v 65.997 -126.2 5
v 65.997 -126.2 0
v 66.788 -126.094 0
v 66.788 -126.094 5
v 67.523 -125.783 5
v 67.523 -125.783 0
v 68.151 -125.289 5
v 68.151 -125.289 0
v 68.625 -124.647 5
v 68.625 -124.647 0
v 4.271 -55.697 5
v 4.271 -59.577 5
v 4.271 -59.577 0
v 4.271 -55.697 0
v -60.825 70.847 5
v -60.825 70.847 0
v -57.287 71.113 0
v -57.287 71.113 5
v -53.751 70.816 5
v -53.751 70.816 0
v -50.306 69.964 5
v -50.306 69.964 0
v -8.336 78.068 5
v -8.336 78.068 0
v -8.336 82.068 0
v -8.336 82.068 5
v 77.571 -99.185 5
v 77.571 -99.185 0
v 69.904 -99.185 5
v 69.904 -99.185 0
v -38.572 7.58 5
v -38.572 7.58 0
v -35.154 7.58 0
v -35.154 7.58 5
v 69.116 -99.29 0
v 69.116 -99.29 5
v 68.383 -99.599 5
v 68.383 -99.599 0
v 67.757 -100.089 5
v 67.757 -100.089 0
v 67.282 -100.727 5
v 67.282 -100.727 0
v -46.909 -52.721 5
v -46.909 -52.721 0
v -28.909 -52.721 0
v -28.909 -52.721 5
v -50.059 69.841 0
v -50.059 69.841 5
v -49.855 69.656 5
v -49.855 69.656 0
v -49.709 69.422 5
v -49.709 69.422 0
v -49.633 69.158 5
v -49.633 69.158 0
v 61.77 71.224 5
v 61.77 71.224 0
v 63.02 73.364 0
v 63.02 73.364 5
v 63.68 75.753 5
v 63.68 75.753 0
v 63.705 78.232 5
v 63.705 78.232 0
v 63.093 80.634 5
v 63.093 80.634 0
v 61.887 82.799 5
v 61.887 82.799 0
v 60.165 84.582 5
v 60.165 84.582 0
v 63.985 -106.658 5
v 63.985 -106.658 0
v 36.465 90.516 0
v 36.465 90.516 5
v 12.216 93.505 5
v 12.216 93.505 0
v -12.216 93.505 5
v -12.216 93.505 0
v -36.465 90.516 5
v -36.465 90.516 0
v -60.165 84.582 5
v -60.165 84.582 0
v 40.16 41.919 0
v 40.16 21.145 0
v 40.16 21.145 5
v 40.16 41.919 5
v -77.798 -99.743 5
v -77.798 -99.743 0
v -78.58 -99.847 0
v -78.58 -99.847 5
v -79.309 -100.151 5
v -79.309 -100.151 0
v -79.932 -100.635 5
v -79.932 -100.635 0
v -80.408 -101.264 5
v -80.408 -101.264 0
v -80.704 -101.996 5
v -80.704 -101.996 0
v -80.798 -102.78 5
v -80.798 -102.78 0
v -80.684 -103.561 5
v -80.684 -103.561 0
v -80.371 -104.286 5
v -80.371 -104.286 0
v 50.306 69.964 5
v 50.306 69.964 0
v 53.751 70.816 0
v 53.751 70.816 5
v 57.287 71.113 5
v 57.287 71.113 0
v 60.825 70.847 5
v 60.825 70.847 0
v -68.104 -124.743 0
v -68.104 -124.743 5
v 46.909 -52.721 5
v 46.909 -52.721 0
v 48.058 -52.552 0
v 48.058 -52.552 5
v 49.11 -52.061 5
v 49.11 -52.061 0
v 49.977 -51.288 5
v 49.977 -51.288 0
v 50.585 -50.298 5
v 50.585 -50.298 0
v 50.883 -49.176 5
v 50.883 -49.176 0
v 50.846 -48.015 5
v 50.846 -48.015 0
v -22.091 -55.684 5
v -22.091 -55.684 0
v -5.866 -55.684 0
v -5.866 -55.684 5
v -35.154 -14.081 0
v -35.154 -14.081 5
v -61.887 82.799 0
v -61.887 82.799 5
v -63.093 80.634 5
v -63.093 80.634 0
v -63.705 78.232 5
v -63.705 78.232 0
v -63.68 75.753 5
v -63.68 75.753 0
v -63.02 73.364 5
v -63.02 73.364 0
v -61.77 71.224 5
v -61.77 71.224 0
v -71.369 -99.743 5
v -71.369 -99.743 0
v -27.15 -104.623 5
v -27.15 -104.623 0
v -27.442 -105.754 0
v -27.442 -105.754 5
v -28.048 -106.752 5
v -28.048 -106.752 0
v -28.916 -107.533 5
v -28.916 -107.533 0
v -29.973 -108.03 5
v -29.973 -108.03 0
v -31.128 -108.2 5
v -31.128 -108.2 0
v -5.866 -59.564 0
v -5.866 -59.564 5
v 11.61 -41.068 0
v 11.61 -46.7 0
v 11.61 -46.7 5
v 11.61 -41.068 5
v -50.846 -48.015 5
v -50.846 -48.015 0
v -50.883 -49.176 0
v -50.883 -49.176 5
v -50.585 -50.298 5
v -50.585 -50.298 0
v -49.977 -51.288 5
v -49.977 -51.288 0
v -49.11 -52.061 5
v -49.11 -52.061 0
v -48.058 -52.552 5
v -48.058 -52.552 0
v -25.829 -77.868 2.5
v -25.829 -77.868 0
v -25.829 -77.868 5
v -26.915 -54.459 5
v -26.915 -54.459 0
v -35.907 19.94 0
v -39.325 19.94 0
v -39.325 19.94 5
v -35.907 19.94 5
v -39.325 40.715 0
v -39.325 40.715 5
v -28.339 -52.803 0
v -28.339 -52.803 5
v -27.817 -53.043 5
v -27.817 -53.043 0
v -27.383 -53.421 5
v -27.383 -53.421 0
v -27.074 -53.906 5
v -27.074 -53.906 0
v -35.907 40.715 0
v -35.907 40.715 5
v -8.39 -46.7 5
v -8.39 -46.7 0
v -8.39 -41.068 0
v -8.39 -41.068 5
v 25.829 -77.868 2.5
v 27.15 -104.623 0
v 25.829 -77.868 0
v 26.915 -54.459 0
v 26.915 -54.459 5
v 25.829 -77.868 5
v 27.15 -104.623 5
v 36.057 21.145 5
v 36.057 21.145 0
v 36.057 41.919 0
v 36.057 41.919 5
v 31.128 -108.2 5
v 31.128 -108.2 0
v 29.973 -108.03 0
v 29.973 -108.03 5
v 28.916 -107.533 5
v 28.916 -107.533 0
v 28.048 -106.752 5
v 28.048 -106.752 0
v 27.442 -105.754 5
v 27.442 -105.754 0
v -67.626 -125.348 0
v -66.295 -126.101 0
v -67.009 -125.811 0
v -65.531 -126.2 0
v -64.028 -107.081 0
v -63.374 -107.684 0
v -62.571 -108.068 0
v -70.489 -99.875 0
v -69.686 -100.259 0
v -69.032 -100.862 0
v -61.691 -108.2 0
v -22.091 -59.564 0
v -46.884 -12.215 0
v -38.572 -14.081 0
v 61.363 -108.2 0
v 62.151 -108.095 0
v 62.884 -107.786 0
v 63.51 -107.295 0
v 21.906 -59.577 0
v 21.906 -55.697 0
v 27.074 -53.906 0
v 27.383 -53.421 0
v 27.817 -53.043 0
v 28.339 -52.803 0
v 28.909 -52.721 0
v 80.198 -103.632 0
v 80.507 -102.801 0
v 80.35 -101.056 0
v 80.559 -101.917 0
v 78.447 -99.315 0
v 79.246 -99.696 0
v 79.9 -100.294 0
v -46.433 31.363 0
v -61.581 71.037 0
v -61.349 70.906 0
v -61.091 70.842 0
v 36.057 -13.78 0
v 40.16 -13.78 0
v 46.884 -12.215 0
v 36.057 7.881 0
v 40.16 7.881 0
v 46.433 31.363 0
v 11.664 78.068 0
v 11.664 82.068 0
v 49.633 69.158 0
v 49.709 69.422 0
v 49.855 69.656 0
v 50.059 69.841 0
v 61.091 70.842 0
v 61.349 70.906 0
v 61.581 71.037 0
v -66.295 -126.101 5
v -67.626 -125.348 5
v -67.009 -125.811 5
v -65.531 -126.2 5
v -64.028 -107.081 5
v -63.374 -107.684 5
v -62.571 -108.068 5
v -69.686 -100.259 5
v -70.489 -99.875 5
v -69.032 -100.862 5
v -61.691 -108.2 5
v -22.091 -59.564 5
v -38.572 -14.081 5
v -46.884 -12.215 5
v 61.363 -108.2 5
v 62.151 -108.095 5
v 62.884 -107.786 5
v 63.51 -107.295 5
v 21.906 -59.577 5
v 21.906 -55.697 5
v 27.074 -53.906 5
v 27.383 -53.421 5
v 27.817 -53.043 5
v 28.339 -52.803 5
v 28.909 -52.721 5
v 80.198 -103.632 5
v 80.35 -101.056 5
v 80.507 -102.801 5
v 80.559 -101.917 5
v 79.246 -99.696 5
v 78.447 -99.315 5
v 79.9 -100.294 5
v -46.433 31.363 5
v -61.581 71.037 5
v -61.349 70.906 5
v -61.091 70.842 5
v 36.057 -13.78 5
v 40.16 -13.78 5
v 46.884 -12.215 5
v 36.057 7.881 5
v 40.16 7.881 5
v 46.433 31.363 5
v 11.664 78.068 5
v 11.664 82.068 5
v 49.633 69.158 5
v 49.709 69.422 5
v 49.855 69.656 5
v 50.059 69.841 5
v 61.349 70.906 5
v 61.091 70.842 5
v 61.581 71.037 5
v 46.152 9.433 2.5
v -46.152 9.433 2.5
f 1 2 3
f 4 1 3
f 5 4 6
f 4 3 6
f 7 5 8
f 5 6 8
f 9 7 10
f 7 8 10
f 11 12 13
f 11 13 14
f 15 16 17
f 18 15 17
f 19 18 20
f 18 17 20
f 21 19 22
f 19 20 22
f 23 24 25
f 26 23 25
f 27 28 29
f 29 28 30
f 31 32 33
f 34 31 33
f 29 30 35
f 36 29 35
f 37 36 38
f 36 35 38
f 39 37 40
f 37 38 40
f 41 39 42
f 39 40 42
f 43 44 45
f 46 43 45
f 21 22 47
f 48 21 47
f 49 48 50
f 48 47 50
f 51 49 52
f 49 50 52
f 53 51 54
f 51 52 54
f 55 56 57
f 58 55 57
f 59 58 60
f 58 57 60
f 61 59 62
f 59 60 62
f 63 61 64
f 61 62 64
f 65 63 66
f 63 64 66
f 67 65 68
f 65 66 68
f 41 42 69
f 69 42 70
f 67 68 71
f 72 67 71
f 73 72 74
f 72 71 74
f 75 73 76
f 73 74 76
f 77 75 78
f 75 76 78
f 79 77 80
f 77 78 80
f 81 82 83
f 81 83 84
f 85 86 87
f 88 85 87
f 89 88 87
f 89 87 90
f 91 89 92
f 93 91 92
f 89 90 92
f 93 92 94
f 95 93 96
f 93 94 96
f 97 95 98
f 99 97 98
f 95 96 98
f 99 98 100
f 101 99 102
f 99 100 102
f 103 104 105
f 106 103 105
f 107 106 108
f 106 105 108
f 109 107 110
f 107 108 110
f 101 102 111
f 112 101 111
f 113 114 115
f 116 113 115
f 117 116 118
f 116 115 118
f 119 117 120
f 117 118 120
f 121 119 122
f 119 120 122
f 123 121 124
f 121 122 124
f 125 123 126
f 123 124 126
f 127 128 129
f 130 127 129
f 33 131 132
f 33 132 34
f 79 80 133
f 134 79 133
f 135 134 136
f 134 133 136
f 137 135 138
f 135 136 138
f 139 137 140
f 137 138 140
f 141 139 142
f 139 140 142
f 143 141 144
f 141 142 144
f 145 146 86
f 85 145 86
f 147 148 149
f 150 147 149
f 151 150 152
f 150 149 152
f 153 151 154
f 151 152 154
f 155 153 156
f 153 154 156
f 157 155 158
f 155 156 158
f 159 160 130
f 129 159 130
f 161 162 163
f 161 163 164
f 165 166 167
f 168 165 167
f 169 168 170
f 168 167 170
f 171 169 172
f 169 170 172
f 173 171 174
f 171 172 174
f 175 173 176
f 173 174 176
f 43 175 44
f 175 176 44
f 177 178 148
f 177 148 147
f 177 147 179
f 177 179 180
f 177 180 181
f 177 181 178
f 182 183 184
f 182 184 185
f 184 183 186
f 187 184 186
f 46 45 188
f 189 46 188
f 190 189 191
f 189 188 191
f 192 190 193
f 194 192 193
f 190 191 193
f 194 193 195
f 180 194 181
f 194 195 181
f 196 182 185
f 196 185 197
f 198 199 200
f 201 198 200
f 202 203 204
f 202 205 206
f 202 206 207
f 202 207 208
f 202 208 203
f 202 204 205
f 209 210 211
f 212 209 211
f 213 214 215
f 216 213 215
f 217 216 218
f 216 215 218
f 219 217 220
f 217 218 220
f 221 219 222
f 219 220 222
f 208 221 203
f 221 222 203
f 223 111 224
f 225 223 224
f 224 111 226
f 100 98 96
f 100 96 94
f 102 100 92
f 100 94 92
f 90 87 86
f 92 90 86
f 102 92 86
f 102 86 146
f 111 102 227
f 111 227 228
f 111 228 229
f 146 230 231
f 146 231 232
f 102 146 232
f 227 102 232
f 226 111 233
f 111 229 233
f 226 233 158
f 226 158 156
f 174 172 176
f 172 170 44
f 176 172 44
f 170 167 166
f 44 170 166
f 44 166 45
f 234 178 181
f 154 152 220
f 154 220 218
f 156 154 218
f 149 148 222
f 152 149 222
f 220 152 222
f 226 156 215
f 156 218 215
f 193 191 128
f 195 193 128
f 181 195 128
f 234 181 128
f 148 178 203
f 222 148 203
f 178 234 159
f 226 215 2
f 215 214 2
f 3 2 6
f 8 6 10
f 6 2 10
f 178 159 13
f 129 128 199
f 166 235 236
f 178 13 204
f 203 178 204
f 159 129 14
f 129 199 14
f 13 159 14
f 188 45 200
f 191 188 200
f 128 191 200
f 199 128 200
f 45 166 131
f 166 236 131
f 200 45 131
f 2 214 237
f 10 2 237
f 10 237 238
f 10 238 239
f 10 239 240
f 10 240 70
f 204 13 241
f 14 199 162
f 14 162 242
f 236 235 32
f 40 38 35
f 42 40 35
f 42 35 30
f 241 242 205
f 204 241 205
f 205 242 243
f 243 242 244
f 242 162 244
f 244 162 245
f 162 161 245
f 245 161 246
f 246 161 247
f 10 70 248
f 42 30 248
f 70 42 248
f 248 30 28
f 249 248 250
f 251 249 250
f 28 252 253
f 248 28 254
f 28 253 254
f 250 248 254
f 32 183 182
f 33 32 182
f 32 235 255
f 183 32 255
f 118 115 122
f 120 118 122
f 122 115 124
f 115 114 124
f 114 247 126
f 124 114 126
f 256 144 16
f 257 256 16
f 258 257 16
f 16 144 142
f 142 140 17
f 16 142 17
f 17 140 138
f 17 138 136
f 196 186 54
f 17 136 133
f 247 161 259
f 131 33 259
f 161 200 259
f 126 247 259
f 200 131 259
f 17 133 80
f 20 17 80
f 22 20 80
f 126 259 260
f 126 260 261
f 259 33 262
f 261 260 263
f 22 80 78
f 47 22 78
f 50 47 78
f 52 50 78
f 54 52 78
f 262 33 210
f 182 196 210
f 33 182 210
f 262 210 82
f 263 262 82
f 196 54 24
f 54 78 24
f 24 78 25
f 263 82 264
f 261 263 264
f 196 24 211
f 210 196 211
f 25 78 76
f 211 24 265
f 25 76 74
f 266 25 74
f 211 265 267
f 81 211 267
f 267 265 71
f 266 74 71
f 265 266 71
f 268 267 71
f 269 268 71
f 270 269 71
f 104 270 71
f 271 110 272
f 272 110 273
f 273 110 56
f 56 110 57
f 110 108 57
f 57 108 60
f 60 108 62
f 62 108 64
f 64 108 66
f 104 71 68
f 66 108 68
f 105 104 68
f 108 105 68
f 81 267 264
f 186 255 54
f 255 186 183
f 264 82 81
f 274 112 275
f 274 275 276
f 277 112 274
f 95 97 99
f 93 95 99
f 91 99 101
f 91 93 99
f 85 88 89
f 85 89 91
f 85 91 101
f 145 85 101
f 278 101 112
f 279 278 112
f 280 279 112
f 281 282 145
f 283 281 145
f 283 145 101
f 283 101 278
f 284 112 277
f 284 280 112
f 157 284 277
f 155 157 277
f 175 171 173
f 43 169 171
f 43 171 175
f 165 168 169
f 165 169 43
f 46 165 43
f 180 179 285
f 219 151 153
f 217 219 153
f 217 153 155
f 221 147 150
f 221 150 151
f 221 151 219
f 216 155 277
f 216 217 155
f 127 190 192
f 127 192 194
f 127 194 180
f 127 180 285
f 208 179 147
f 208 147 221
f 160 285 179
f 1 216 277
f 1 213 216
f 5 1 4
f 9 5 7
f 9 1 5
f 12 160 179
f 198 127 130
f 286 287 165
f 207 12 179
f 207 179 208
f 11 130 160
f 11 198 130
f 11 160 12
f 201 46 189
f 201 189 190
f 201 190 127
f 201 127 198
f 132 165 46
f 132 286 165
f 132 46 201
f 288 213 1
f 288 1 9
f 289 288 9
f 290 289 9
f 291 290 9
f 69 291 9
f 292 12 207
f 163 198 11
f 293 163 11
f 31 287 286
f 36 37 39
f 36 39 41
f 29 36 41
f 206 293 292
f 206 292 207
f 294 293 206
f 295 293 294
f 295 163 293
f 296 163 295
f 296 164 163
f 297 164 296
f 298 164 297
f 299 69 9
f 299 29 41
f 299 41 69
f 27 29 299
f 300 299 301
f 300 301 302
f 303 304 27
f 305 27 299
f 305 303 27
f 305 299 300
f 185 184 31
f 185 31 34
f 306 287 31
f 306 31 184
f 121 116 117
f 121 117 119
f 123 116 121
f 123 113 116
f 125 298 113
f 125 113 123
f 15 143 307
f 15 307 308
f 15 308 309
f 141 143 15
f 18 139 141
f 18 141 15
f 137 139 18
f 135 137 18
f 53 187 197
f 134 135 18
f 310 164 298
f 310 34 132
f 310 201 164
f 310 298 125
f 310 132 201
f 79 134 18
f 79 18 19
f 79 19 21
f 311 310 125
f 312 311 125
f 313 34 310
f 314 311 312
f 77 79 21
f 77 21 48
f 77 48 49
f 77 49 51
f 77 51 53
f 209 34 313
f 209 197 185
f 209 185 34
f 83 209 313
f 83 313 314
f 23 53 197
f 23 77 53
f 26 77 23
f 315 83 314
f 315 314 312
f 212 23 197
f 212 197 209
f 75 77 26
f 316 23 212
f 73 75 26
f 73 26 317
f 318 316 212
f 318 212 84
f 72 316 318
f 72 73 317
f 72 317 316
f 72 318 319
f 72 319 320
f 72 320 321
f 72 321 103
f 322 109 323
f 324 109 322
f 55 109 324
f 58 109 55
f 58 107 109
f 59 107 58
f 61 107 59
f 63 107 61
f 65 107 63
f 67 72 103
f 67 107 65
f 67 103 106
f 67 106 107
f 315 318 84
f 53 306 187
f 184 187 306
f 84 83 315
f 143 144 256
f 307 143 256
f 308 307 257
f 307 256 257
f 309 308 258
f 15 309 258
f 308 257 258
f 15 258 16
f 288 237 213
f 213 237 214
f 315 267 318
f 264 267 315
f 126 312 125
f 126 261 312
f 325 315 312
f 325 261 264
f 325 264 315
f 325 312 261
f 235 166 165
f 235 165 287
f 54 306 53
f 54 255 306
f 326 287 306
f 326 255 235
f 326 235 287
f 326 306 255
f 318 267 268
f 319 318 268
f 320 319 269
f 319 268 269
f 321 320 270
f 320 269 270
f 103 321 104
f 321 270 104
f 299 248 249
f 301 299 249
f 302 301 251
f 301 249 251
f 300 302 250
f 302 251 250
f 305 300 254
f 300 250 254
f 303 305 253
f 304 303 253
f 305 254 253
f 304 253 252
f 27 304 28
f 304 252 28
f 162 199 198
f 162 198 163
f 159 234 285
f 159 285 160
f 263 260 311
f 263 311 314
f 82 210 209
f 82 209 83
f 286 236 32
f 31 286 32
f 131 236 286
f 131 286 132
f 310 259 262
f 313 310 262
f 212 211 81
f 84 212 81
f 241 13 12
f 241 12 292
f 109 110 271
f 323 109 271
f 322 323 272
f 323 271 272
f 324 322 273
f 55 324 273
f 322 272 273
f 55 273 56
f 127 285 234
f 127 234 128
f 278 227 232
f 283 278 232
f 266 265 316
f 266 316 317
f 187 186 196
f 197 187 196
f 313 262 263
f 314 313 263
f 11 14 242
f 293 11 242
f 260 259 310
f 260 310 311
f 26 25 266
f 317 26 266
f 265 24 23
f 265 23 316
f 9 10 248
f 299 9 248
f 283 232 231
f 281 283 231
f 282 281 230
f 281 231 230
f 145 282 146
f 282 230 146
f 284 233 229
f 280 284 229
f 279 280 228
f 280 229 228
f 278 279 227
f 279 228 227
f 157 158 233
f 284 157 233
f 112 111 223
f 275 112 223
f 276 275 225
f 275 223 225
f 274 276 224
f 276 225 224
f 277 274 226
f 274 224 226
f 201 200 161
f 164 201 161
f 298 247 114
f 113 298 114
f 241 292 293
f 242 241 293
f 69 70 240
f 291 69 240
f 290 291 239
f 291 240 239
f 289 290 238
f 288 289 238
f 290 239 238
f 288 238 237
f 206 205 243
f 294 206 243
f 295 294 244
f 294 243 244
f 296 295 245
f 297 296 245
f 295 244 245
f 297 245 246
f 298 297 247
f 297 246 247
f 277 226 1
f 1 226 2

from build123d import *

# Parameters (mm, degrees)
SKETCH1_W           = 20
SKETCH1_H           = 4
SKETCH1_W_2         = 17.635389858
SKETCH1_H_2         = 3.879785769
SKETCH1_W_3         = 4.102446126
SKETCH1_H_3         = 20.774322756
SKETCH1_H_4         = 21.660832558
SKETCH1_W_4         = 3.418162198
SKETCH1_H_5         = 5.631856247
SKETCH1_W_5         = 16.224558669
BOSS_EXTRUDE3_DEPTH = 5


with BuildPart() as part:
    # Sketch1 → Boss-Extrude3 (new body)
    with BuildSketch(Plane.XY):
        with BuildLine():
            Line((-46.908869484, -52.720617246), (-28.908869484, -52.720617246))
            ThreePointArc((-28.908869484, -52.720617246), (-27.586230621, -53.216332062), (-26.915218553, -54.459251828))
            add(Edge.make_bspline(
                [(-27.150183285, -104.622936523), (-24.042180825, -75.385235173), (-26.915218553, -54.459251828)],
                knots=[4.03312472, 4.03312472, 4.03312472, 5.695988701, 5.695988701, 5.695988701], degree=2, weights=[1, 0.673818357, 1]))
            ThreePointArc((-27.150183285, -104.622936523), (-28.453010553, -107.174276905), (-31.127773146, -108.200113985))
            Line((-31.127773146, -108.200113985), (-61.691034949, -108.200113985))
            ThreePointArc((-61.691034949, -108.200113985), (-62.986836684, -107.905829762), (-64.028415748, -107.080712561))
            Line((-64.028415748, -107.080712561), (-69.031690033, -100.862183312))
            ThreePointArc((-69.031690033, -100.862183312), (-70.073269096, -100.037066111), (-71.369070832, -99.742781887))
            Line((-71.369070832, -99.742781887), (-77.798044438, -99.742781887))
            ThreePointArc((-77.798044438, -99.742781887), (-80.408451089, -101.264344498), (-80.370926301, -104.285597145))
            Line((-80.370926301, -104.285597145), (-68.103793269, -124.742929243))
            ThreePointArc((-68.103793269, -124.742929243), (-67.009348795, -125.810520637), (-65.530911406, -126.200113985))
            Line((-65.530911406, -126.200113985), (65.997283419, -126.200113985))
            ThreePointArc((65.997283419, -126.200113985), (67.523464533, -125.782897602), (68.625147136, -124.647294791))
            Line((68.625147136, -124.647294791), (80.198497538, -103.631822855))
            ThreePointArc((80.198497538, -103.631822855), (80.153417437, -100.658460936), (77.570633821, -99.18464205))
            Line((77.570633821, -99.18464205), (69.904360471, -99.18464205))
            ThreePointArc((69.904360471, -99.18464205), (68.383344987, -99.598812996), (67.282303117, -100.726967452))
            Line((67.282303117, -100.726967452), (63.985194726, -106.657788583))
            ThreePointArc((63.985194726, -106.657788583), (62.884152857, -107.785943039), (61.363137372, -108.200113985))
            Line((61.363137372, -108.200113985), (31.127773146, -108.200113985))
            ThreePointArc((31.127773146, -108.200113985), (28.453010553, -107.174276905), (27.150183285, -104.622936523))
            add(Edge.make_bspline(
                [(26.915218553, -54.459251828), (24.042180825, -75.385235173), (27.150183285, -104.622936523)],
                knots=[0.587196606, 0.587196606, 0.587196606, 2.250060588, 2.250060588, 2.250060588], degree=2, weights=[1, 0.673818357, 1]))
            ThreePointArc((26.915218553, -54.459251828), (27.586230621, -53.216332062), (28.908869484, -52.720617246))
            Line((28.908869484, -52.720617246), (46.908869484, -52.720617246))
            ThreePointArc((46.908869484, -52.720617246), (49.976562122, -51.287573006), (50.846185128, -48.015248183))
            add(Edge.make_bspline(
                [(49.632919584, 69.157622076), (40.820331779, 7.94829107), (50.846185128, -48.015248183)],
                knots=[0.92694213, 0.92694213, 0.92694213, 2.321414523, 2.321414523, 2.321414523], degree=2, weights=[1, 0.766619755, 1]))
            ThreePointArc((49.632919584, 69.157622076), (49.855189189, 69.656136563), (50.306120041, 69.963678167))
            ThreePointArc((50.306120041, 69.963678167), (55.512793259, 71.035230988), (60.82526432, 70.847287719))
            ThreePointArc((60.82526432, 70.847287719), (61.349200112, 70.906348269), (61.770271319, 71.223674443))
            ThreePointArc((61.770271319, 71.223674443), (63.704662293, 78.231916543), (60.165141812, 84.582437823))
            ThreePointArc((60.165141812, 84.582437823), (0, 93.879837075), (-60.165141812, 84.582437823))
            ThreePointArc((-60.165141812, 84.582437823), (-63.704662293, 78.231916543), (-61.770271319, 71.223674443))
            ThreePointArc((-61.770271319, 71.223674443), (-61.349200112, 70.906348269), (-60.82526432, 70.847287719))
            ThreePointArc((-60.82526432, 70.847287719), (-55.512793259, 71.035230988), (-50.306120041, 69.963678167))
            ThreePointArc((-50.306120041, 69.963678167), (-49.855189189, 69.656136563), (-49.632919584, 69.157622076))
            add(Edge.make_bspline(
                [(-50.846185128, -48.015248183), (-40.820331779, 7.94829107), (-49.632919584, 69.157622076)],
                knots=[3.961770785, 3.961770785, 3.961770785, 5.356243177, 5.356243177, 5.356243177], degree=2, weights=[1, 0.766619755, 1]))
            ThreePointArc((-50.846185128, -48.015248183), (-49.976562122, -51.287573006), (-46.908869484, -52.720617246))
        make_face()
        with Locations((1.663675391, 80.068012143)):
            Rectangle(SKETCH1_W, SKETCH1_H, mode=Mode.SUBTRACT)
        with Locations((13.088476945, -57.636754326)):
            Rectangle(SKETCH1_W_2, SKETCH1_H_2, mode=Mode.SUBTRACT)
        with Locations((38.10837085, 31.531905503)):
            Rectangle(SKETCH1_W_3, SKETCH1_H_3, mode=Mode.SUBTRACT)
        with Locations((38.10837085, -2.949787997)):
            Rectangle(SKETCH1_W_3, SKETCH1_H_4, mode=Mode.SUBTRACT)
        with Locations((-37.615690315, 30.327596937)):
            Rectangle(SKETCH1_W_4, SKETCH1_H_3, mode=Mode.SUBTRACT)
        with Locations((-36.862997462, -3.250865139)):
            Rectangle(SKETCH1_W_4, SKETCH1_H_4, mode=Mode.SUBTRACT)
        with Locations((1.610001599, -43.883655008)):
            Rectangle(SKETCH1_W, SKETCH1_H_5, mode=Mode.SUBTRACT)
        with Locations((-13.978236501, -57.624038848)):
            Rectangle(SKETCH1_W_5, SKETCH1_H_2, mode=Mode.SUBTRACT)
    extrude(amount=BOSS_EXTRUDE3_DEPTH)


solid = part.part
